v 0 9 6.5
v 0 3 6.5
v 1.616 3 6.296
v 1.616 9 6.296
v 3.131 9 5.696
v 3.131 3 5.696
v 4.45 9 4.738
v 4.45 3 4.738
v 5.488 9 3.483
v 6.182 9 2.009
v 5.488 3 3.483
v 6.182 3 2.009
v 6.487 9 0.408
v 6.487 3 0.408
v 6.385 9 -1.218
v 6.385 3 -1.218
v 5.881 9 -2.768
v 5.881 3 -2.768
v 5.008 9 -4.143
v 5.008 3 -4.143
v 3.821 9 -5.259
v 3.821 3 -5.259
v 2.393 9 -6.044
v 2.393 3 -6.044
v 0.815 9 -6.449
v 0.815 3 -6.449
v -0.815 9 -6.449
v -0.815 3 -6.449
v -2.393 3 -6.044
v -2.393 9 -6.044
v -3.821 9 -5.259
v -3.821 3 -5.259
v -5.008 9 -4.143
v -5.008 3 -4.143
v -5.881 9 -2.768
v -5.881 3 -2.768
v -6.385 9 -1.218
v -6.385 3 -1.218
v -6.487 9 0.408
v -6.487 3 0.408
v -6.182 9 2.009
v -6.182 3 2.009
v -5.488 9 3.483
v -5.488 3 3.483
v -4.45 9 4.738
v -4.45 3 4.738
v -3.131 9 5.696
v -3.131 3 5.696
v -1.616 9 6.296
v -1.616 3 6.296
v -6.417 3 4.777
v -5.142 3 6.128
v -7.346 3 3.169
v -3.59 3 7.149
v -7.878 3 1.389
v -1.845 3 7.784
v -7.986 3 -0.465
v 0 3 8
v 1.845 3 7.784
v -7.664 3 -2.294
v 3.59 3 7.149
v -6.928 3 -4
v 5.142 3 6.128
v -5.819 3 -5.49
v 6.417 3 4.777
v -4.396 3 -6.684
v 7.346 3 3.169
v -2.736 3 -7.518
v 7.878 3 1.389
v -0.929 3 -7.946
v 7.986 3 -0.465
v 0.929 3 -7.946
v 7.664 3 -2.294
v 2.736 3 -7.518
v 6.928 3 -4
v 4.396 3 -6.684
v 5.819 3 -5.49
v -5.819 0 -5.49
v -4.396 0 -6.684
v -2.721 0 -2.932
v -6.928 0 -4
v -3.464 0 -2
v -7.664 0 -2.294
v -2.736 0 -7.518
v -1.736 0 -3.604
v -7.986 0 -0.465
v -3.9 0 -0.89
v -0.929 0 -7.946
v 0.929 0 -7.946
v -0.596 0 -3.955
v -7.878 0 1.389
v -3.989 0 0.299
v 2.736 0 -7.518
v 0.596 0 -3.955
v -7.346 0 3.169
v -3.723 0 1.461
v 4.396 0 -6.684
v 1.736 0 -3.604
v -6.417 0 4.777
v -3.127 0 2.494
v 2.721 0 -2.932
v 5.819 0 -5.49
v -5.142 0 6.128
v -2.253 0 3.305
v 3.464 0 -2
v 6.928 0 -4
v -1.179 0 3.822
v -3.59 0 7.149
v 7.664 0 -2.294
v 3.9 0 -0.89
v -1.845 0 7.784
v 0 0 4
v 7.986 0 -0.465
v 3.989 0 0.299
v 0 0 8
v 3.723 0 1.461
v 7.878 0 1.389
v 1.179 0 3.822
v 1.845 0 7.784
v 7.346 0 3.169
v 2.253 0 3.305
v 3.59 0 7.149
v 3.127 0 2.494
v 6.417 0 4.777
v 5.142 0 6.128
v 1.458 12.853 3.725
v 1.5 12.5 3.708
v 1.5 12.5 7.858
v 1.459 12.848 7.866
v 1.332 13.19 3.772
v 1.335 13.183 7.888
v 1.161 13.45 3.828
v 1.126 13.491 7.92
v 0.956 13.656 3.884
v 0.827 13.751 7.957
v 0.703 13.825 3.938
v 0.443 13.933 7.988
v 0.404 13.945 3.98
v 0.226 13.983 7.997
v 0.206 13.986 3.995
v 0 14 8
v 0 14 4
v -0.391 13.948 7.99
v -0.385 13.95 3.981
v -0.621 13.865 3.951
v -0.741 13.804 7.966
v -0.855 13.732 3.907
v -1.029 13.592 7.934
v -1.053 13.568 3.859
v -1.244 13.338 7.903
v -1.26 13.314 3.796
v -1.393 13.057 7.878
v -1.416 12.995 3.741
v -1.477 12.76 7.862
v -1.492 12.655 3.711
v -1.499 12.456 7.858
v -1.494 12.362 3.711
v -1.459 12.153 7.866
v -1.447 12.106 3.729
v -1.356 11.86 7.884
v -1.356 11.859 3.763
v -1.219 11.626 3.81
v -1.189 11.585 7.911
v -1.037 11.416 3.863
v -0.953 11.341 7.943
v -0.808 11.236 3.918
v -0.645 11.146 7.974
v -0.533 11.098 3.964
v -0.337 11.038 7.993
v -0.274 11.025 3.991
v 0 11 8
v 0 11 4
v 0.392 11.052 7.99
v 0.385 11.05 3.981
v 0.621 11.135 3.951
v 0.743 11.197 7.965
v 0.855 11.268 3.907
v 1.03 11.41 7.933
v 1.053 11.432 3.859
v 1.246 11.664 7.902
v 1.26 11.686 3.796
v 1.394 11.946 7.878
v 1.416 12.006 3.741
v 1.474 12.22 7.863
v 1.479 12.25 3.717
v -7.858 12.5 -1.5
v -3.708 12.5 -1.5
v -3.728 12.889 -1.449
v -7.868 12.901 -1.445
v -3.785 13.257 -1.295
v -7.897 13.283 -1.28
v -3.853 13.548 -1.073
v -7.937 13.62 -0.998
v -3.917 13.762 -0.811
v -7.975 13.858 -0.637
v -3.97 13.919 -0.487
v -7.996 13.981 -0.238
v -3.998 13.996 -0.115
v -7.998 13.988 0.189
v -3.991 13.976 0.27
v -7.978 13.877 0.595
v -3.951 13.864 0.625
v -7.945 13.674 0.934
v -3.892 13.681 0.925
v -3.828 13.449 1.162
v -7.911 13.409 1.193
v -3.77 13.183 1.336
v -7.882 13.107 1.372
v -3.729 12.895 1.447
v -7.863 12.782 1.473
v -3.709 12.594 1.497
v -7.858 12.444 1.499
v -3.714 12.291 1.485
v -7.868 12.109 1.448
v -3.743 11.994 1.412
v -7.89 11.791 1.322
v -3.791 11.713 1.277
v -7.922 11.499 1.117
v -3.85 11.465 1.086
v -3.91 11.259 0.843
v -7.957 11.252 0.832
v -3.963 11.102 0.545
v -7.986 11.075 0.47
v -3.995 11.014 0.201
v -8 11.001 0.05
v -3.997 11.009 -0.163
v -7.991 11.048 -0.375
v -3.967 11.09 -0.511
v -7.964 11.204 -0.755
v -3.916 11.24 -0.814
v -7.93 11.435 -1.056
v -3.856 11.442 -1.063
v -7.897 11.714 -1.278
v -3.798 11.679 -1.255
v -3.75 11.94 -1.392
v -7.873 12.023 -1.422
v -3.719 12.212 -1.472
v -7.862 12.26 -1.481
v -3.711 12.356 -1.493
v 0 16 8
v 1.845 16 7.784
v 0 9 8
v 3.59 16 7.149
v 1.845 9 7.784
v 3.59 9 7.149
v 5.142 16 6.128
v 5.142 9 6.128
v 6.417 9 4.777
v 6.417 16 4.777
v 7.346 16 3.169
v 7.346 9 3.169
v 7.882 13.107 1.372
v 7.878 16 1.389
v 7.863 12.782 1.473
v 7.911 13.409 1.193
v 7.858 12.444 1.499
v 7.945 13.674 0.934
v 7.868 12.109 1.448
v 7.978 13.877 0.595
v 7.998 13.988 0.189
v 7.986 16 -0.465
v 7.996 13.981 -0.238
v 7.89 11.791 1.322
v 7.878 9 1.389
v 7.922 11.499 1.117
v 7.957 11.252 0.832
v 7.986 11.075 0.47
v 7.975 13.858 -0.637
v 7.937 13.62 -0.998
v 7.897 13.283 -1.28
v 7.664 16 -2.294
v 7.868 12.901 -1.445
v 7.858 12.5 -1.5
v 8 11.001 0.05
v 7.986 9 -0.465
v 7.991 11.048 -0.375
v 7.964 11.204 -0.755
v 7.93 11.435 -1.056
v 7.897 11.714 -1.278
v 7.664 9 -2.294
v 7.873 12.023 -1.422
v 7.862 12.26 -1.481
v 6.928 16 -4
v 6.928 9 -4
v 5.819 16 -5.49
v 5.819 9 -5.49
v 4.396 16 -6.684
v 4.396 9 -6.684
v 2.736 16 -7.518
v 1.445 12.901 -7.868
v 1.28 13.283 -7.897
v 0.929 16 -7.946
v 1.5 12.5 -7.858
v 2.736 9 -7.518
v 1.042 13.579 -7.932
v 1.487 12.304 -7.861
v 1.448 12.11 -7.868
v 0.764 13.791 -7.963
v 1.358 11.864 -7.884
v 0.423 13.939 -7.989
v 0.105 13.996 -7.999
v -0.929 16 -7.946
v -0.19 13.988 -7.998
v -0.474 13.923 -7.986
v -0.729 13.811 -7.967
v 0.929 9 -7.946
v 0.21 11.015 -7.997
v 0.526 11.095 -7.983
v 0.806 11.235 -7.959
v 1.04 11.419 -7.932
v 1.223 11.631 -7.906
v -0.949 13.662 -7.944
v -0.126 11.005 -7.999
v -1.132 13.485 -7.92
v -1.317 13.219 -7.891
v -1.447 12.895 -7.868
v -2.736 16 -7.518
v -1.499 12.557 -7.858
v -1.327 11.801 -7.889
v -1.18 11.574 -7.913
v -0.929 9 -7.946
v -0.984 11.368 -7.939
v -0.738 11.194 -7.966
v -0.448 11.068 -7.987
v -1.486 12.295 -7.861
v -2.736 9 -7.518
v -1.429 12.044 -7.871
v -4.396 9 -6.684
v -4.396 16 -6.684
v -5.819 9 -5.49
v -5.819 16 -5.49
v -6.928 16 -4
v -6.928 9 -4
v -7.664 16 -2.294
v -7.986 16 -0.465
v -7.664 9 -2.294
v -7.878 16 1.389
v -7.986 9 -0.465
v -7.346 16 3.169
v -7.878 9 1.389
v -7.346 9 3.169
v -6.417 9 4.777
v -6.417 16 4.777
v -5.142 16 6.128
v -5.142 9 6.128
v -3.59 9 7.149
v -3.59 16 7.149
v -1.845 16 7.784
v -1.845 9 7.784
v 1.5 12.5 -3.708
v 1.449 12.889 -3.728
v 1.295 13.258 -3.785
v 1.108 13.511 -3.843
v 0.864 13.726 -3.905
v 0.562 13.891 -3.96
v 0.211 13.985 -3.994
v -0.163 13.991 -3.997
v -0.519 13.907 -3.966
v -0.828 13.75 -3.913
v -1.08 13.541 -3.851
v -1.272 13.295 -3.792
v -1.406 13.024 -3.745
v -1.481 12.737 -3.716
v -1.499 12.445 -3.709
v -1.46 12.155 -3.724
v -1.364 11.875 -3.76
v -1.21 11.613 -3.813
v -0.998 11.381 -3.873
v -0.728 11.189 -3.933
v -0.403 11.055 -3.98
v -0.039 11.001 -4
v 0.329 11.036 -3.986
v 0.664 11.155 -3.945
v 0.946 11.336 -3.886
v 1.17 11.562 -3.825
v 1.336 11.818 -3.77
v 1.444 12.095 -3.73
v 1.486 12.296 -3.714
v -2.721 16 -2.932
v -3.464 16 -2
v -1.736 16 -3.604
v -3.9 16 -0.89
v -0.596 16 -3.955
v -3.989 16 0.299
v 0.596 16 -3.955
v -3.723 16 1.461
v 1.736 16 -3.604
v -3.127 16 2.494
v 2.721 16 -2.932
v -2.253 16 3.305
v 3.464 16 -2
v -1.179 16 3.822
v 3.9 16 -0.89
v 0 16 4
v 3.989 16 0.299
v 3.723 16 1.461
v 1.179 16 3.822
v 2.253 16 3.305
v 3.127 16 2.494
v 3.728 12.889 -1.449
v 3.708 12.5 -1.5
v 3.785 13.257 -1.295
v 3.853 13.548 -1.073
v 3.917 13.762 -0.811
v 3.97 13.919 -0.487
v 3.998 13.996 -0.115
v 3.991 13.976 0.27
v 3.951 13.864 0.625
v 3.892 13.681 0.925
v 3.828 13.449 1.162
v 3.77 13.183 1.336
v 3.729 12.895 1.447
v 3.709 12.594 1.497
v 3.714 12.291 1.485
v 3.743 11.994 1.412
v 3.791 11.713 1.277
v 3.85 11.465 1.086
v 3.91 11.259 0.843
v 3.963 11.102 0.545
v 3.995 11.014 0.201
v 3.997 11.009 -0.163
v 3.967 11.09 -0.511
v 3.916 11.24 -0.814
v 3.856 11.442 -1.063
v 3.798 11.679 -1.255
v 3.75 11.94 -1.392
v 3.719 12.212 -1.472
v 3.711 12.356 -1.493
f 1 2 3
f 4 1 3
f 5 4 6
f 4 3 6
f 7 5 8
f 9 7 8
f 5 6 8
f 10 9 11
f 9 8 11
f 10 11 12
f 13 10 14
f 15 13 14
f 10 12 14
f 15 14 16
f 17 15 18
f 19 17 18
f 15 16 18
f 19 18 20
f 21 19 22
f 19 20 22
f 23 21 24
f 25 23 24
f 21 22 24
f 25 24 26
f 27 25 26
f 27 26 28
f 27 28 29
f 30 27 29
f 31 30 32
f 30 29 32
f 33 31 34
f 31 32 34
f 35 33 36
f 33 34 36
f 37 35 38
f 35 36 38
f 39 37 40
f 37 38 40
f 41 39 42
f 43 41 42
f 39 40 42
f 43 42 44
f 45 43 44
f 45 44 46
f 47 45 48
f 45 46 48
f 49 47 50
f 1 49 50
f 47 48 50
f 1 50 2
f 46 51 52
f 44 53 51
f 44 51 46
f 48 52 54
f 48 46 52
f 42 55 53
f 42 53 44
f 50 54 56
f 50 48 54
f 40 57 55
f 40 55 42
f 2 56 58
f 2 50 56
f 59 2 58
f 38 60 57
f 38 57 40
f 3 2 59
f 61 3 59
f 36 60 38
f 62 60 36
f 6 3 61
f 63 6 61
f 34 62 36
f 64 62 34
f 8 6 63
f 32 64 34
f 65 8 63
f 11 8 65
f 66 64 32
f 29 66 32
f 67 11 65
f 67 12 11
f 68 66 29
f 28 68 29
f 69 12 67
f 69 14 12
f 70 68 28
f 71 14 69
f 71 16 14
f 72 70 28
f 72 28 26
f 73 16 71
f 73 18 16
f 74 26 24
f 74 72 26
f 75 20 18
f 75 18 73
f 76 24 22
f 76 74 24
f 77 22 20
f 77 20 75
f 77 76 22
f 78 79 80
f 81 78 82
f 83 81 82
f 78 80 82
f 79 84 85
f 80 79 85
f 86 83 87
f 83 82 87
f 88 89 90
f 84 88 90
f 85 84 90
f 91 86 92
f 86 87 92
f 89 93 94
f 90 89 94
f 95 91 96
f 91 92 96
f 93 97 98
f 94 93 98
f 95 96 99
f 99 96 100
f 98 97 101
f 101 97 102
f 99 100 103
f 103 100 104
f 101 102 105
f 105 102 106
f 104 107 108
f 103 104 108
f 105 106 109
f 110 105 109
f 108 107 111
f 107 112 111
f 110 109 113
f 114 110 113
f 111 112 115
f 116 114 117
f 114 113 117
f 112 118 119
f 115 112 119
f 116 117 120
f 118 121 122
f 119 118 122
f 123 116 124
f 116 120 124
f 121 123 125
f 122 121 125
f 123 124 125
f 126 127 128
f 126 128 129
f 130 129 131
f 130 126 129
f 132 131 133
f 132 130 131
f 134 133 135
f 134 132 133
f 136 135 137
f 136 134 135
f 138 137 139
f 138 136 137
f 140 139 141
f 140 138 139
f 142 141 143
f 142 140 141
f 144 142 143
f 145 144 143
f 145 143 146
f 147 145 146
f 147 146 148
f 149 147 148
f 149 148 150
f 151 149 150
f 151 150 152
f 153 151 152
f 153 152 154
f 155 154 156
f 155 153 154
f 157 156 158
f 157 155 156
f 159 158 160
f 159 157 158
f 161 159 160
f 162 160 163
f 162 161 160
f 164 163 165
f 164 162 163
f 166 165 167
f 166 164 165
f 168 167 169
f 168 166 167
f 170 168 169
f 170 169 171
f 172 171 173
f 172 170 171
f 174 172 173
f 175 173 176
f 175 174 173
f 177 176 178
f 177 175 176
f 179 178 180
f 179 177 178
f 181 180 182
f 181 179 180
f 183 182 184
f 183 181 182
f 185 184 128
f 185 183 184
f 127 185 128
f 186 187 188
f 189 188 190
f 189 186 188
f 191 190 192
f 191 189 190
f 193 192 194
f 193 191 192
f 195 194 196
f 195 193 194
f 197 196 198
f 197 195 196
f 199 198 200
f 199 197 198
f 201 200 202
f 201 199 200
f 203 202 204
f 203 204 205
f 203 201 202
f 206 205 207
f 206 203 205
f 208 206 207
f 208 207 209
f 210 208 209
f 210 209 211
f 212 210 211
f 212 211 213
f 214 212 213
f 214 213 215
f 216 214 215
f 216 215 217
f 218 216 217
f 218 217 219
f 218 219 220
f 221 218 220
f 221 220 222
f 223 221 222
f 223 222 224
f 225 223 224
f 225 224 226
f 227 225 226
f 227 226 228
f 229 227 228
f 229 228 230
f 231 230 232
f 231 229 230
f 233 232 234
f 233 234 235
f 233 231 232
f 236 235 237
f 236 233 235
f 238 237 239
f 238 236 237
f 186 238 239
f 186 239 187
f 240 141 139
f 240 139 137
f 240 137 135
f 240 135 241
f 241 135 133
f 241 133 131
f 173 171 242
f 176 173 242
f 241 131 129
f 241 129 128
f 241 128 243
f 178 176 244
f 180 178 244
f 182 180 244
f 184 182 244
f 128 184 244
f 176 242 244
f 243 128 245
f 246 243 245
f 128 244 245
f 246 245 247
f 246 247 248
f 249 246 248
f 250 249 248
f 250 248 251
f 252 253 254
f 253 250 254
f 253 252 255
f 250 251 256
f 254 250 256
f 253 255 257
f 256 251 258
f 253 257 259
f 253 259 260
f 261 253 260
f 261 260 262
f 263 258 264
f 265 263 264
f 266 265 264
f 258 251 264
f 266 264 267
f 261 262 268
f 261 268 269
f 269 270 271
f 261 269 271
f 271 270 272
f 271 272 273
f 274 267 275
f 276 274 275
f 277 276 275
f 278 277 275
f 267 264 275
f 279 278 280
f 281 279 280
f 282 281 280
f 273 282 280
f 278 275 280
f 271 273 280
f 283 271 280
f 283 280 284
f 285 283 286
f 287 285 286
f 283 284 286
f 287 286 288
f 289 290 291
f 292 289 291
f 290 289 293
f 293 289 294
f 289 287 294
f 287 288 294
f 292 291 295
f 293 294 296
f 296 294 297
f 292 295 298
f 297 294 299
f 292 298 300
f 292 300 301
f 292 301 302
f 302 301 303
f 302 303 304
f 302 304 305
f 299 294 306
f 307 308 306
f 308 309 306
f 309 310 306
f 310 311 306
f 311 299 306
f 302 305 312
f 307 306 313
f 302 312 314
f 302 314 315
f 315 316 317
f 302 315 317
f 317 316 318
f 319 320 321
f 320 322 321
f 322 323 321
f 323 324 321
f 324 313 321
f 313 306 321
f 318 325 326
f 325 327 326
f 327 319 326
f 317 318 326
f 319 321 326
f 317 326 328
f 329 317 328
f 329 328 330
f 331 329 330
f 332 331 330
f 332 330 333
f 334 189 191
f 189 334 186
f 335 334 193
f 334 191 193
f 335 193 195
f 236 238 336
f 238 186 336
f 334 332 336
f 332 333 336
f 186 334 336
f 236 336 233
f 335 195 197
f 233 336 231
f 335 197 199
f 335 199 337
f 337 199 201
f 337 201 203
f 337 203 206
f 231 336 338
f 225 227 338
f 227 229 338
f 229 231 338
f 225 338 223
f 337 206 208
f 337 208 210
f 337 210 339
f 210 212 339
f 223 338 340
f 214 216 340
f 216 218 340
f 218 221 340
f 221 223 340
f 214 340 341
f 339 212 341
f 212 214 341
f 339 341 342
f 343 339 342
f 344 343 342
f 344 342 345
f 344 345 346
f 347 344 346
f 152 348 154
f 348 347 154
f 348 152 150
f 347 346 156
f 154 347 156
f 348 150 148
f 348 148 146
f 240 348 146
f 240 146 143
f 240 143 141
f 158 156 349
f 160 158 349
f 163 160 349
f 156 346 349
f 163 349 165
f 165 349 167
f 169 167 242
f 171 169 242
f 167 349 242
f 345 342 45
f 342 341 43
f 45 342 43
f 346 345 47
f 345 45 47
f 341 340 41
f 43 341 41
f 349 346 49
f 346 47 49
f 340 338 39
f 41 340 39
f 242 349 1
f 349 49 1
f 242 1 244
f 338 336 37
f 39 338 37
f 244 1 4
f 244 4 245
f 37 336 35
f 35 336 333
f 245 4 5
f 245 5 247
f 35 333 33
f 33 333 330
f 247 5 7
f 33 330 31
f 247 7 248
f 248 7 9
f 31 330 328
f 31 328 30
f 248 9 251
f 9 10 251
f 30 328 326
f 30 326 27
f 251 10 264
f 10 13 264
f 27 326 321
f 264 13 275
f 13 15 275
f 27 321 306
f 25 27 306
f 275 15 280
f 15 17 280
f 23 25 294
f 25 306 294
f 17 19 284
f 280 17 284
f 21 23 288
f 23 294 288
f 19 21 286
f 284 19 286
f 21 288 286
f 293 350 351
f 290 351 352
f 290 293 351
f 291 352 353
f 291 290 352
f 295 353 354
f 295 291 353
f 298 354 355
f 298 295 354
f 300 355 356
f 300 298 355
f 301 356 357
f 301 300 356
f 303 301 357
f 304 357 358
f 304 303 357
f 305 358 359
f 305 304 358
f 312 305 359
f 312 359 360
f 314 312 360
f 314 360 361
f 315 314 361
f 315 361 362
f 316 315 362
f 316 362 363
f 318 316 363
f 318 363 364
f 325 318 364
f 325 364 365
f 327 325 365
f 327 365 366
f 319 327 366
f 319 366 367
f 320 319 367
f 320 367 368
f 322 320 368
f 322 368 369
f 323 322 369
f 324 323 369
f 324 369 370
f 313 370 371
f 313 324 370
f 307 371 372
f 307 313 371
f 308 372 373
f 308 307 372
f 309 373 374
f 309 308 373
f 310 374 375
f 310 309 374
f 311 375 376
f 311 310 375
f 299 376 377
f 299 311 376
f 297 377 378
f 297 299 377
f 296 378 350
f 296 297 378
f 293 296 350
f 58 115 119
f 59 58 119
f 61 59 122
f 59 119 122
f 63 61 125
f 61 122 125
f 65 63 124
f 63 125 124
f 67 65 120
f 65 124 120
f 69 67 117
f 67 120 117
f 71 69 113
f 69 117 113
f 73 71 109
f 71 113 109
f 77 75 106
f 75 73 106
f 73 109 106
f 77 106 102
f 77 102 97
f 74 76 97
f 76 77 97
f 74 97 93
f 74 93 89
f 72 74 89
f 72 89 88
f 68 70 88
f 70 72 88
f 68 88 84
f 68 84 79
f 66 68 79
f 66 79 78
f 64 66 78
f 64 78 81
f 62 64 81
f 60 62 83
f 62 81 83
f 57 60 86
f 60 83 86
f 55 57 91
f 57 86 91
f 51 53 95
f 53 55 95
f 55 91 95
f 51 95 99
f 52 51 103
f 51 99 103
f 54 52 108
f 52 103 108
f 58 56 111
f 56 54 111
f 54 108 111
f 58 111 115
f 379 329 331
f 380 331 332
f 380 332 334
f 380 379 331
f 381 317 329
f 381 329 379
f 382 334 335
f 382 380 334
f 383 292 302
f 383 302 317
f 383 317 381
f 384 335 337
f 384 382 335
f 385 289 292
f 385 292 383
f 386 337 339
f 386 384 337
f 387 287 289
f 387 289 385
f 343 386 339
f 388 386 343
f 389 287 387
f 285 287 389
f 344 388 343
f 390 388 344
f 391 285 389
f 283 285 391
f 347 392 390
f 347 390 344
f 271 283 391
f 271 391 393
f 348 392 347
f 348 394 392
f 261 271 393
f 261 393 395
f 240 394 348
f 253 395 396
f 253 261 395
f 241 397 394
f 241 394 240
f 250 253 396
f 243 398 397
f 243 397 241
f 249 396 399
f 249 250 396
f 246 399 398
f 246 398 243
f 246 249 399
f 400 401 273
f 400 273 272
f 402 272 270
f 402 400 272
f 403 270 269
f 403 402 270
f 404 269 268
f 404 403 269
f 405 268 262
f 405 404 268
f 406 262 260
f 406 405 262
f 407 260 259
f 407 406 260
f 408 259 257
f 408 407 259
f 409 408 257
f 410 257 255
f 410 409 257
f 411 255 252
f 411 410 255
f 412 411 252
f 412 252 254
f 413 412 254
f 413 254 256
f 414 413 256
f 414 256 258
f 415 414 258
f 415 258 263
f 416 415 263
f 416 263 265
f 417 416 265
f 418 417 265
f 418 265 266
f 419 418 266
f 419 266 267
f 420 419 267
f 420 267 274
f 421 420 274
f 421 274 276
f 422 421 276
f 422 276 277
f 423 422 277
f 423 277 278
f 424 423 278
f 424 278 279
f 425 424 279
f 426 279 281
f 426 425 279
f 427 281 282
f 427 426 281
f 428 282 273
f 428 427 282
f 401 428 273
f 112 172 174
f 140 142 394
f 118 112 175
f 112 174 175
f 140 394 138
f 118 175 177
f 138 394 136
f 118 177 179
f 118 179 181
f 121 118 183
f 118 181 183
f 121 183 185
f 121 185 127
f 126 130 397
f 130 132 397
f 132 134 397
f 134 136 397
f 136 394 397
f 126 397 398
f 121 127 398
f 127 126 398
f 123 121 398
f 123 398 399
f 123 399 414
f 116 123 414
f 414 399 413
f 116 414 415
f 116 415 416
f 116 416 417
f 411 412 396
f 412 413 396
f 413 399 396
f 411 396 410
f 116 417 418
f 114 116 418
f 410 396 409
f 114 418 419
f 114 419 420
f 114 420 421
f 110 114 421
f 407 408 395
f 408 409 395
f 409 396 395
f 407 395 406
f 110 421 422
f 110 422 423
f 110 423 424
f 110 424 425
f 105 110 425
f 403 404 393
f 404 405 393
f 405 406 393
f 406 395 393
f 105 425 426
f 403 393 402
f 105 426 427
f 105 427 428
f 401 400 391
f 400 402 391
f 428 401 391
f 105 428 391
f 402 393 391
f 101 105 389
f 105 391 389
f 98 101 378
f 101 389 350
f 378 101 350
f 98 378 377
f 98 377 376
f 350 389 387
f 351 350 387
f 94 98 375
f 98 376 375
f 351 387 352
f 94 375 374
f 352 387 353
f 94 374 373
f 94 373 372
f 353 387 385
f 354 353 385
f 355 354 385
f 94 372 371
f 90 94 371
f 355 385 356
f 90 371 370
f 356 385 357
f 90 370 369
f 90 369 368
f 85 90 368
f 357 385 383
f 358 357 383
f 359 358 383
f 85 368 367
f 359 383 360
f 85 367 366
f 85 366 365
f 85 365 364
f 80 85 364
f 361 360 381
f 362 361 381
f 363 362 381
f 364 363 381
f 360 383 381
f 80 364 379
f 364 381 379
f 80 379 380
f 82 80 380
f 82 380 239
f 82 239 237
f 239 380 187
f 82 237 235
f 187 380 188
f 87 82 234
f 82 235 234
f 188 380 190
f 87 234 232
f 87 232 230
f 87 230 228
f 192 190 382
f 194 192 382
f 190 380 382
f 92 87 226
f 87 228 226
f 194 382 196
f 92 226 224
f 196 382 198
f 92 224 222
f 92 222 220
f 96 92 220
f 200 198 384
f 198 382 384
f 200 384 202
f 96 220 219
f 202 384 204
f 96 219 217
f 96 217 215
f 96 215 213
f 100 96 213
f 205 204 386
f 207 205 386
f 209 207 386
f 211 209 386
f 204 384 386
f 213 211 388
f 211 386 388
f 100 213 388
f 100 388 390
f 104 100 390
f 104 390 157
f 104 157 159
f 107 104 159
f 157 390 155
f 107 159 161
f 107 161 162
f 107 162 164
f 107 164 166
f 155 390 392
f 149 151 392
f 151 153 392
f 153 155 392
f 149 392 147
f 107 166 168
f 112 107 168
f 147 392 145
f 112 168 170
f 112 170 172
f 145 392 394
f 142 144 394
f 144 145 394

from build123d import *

# Parameters (mm, degrees)
SKETCH_1_R               = 8
EXTRUDE_1_DEPTH          = 16
SKETCH_2_R               = 4
CUT_EXTRUDE_1_DEPTH      = 20.595917942
SKETCH_3_OUTSIDE_W       = 23.542
SKETCH_3_OUTSIDE_H       = 23.542
SKETCH_3_OUTSIDE_R       = 6.5
CUT_EXTRUDE_2_DEPTH      = 6
CUT_EXTRUDE_3_DEPTH      = 20.595917942
CUT_EXTRUDE_3_DEPTH_BACK = 20.595917942
SKETCH_4_R               = 1.5
CUT_EXTRUDE_4_DEPTH      = 20.595918116
CUT_EXTRUDE_4_DEPTH_BACK = 20.595918116
SKETCH_5_R               = 1.5


with BuildPart() as part:
    # 草图1 → 凸台-拉伸1 (new body)
    with BuildSketch(Plane(origin=(0, 0, 0), x_dir=(1, 0, 0), z_dir=(0, 1, 0))):
        with Locations(Location((0, 0, 0), (0, 0, 270))):
            Circle(SKETCH_1_R)
    extrude(amount=EXTRUDE_1_DEPTH)

    # 草图2 → 切除-拉伸1 (cut, through all)
    with BuildSketch(Plane(origin=(0, 16, 0), x_dir=(1, 0, 0), z_dir=(0, 1, 0))):
        with Locations(Location((0, 0, 0), (0, 0, 270))):
            Circle(SKETCH_2_R)
    extrude(amount=-CUT_EXTRUDE_1_DEPTH, mode=Mode.SUBTRACT)

    # 草图3 outside → 切除-拉伸2 (cut)
    with BuildSketch(Plane(origin=(0, 3, 0), x_dir=(1, 0, 0), z_dir=(0, 1, 0))):
        Rectangle(SKETCH_3_OUTSIDE_W, SKETCH_3_OUTSIDE_H)
        with Locations(Location((0, 0, 0), (0, 0, 270))):
            Circle(SKETCH_3_OUTSIDE_R, mode=Mode.SUBTRACT)
    extrude(amount=CUT_EXTRUDE_2_DEPTH, mode=Mode.SUBTRACT)

    # 草图4 → 切除-拉伸3 (cut, two sides: drawn at the far end of the back side and taken through both)
    with BuildSketch(Plane(origin=(0, 0, 0), x_dir=(0, 0, -1), z_dir=(1, 0, 0)).offset(-CUT_EXTRUDE_3_DEPTH_BACK)):
        with Locations((0, 12.5)):
            Circle(SKETCH_4_R)
    extrude(amount=CUT_EXTRUDE_3_DEPTH + CUT_EXTRUDE_3_DEPTH_BACK, mode=Mode.SUBTRACT)

    # 草图5 → 切除-拉伸4 (cut, two sides: drawn at the far end of the back side and taken through both)
    with BuildSketch(Plane.XY.offset(-CUT_EXTRUDE_4_DEPTH_BACK)):
        with Locations((0, 12.5)):
            Circle(SKETCH_5_R)
    extrude(amount=CUT_EXTRUDE_4_DEPTH + CUT_EXTRUDE_4_DEPTH_BACK, mode=Mode.SUBTRACT)


solid = part.part
